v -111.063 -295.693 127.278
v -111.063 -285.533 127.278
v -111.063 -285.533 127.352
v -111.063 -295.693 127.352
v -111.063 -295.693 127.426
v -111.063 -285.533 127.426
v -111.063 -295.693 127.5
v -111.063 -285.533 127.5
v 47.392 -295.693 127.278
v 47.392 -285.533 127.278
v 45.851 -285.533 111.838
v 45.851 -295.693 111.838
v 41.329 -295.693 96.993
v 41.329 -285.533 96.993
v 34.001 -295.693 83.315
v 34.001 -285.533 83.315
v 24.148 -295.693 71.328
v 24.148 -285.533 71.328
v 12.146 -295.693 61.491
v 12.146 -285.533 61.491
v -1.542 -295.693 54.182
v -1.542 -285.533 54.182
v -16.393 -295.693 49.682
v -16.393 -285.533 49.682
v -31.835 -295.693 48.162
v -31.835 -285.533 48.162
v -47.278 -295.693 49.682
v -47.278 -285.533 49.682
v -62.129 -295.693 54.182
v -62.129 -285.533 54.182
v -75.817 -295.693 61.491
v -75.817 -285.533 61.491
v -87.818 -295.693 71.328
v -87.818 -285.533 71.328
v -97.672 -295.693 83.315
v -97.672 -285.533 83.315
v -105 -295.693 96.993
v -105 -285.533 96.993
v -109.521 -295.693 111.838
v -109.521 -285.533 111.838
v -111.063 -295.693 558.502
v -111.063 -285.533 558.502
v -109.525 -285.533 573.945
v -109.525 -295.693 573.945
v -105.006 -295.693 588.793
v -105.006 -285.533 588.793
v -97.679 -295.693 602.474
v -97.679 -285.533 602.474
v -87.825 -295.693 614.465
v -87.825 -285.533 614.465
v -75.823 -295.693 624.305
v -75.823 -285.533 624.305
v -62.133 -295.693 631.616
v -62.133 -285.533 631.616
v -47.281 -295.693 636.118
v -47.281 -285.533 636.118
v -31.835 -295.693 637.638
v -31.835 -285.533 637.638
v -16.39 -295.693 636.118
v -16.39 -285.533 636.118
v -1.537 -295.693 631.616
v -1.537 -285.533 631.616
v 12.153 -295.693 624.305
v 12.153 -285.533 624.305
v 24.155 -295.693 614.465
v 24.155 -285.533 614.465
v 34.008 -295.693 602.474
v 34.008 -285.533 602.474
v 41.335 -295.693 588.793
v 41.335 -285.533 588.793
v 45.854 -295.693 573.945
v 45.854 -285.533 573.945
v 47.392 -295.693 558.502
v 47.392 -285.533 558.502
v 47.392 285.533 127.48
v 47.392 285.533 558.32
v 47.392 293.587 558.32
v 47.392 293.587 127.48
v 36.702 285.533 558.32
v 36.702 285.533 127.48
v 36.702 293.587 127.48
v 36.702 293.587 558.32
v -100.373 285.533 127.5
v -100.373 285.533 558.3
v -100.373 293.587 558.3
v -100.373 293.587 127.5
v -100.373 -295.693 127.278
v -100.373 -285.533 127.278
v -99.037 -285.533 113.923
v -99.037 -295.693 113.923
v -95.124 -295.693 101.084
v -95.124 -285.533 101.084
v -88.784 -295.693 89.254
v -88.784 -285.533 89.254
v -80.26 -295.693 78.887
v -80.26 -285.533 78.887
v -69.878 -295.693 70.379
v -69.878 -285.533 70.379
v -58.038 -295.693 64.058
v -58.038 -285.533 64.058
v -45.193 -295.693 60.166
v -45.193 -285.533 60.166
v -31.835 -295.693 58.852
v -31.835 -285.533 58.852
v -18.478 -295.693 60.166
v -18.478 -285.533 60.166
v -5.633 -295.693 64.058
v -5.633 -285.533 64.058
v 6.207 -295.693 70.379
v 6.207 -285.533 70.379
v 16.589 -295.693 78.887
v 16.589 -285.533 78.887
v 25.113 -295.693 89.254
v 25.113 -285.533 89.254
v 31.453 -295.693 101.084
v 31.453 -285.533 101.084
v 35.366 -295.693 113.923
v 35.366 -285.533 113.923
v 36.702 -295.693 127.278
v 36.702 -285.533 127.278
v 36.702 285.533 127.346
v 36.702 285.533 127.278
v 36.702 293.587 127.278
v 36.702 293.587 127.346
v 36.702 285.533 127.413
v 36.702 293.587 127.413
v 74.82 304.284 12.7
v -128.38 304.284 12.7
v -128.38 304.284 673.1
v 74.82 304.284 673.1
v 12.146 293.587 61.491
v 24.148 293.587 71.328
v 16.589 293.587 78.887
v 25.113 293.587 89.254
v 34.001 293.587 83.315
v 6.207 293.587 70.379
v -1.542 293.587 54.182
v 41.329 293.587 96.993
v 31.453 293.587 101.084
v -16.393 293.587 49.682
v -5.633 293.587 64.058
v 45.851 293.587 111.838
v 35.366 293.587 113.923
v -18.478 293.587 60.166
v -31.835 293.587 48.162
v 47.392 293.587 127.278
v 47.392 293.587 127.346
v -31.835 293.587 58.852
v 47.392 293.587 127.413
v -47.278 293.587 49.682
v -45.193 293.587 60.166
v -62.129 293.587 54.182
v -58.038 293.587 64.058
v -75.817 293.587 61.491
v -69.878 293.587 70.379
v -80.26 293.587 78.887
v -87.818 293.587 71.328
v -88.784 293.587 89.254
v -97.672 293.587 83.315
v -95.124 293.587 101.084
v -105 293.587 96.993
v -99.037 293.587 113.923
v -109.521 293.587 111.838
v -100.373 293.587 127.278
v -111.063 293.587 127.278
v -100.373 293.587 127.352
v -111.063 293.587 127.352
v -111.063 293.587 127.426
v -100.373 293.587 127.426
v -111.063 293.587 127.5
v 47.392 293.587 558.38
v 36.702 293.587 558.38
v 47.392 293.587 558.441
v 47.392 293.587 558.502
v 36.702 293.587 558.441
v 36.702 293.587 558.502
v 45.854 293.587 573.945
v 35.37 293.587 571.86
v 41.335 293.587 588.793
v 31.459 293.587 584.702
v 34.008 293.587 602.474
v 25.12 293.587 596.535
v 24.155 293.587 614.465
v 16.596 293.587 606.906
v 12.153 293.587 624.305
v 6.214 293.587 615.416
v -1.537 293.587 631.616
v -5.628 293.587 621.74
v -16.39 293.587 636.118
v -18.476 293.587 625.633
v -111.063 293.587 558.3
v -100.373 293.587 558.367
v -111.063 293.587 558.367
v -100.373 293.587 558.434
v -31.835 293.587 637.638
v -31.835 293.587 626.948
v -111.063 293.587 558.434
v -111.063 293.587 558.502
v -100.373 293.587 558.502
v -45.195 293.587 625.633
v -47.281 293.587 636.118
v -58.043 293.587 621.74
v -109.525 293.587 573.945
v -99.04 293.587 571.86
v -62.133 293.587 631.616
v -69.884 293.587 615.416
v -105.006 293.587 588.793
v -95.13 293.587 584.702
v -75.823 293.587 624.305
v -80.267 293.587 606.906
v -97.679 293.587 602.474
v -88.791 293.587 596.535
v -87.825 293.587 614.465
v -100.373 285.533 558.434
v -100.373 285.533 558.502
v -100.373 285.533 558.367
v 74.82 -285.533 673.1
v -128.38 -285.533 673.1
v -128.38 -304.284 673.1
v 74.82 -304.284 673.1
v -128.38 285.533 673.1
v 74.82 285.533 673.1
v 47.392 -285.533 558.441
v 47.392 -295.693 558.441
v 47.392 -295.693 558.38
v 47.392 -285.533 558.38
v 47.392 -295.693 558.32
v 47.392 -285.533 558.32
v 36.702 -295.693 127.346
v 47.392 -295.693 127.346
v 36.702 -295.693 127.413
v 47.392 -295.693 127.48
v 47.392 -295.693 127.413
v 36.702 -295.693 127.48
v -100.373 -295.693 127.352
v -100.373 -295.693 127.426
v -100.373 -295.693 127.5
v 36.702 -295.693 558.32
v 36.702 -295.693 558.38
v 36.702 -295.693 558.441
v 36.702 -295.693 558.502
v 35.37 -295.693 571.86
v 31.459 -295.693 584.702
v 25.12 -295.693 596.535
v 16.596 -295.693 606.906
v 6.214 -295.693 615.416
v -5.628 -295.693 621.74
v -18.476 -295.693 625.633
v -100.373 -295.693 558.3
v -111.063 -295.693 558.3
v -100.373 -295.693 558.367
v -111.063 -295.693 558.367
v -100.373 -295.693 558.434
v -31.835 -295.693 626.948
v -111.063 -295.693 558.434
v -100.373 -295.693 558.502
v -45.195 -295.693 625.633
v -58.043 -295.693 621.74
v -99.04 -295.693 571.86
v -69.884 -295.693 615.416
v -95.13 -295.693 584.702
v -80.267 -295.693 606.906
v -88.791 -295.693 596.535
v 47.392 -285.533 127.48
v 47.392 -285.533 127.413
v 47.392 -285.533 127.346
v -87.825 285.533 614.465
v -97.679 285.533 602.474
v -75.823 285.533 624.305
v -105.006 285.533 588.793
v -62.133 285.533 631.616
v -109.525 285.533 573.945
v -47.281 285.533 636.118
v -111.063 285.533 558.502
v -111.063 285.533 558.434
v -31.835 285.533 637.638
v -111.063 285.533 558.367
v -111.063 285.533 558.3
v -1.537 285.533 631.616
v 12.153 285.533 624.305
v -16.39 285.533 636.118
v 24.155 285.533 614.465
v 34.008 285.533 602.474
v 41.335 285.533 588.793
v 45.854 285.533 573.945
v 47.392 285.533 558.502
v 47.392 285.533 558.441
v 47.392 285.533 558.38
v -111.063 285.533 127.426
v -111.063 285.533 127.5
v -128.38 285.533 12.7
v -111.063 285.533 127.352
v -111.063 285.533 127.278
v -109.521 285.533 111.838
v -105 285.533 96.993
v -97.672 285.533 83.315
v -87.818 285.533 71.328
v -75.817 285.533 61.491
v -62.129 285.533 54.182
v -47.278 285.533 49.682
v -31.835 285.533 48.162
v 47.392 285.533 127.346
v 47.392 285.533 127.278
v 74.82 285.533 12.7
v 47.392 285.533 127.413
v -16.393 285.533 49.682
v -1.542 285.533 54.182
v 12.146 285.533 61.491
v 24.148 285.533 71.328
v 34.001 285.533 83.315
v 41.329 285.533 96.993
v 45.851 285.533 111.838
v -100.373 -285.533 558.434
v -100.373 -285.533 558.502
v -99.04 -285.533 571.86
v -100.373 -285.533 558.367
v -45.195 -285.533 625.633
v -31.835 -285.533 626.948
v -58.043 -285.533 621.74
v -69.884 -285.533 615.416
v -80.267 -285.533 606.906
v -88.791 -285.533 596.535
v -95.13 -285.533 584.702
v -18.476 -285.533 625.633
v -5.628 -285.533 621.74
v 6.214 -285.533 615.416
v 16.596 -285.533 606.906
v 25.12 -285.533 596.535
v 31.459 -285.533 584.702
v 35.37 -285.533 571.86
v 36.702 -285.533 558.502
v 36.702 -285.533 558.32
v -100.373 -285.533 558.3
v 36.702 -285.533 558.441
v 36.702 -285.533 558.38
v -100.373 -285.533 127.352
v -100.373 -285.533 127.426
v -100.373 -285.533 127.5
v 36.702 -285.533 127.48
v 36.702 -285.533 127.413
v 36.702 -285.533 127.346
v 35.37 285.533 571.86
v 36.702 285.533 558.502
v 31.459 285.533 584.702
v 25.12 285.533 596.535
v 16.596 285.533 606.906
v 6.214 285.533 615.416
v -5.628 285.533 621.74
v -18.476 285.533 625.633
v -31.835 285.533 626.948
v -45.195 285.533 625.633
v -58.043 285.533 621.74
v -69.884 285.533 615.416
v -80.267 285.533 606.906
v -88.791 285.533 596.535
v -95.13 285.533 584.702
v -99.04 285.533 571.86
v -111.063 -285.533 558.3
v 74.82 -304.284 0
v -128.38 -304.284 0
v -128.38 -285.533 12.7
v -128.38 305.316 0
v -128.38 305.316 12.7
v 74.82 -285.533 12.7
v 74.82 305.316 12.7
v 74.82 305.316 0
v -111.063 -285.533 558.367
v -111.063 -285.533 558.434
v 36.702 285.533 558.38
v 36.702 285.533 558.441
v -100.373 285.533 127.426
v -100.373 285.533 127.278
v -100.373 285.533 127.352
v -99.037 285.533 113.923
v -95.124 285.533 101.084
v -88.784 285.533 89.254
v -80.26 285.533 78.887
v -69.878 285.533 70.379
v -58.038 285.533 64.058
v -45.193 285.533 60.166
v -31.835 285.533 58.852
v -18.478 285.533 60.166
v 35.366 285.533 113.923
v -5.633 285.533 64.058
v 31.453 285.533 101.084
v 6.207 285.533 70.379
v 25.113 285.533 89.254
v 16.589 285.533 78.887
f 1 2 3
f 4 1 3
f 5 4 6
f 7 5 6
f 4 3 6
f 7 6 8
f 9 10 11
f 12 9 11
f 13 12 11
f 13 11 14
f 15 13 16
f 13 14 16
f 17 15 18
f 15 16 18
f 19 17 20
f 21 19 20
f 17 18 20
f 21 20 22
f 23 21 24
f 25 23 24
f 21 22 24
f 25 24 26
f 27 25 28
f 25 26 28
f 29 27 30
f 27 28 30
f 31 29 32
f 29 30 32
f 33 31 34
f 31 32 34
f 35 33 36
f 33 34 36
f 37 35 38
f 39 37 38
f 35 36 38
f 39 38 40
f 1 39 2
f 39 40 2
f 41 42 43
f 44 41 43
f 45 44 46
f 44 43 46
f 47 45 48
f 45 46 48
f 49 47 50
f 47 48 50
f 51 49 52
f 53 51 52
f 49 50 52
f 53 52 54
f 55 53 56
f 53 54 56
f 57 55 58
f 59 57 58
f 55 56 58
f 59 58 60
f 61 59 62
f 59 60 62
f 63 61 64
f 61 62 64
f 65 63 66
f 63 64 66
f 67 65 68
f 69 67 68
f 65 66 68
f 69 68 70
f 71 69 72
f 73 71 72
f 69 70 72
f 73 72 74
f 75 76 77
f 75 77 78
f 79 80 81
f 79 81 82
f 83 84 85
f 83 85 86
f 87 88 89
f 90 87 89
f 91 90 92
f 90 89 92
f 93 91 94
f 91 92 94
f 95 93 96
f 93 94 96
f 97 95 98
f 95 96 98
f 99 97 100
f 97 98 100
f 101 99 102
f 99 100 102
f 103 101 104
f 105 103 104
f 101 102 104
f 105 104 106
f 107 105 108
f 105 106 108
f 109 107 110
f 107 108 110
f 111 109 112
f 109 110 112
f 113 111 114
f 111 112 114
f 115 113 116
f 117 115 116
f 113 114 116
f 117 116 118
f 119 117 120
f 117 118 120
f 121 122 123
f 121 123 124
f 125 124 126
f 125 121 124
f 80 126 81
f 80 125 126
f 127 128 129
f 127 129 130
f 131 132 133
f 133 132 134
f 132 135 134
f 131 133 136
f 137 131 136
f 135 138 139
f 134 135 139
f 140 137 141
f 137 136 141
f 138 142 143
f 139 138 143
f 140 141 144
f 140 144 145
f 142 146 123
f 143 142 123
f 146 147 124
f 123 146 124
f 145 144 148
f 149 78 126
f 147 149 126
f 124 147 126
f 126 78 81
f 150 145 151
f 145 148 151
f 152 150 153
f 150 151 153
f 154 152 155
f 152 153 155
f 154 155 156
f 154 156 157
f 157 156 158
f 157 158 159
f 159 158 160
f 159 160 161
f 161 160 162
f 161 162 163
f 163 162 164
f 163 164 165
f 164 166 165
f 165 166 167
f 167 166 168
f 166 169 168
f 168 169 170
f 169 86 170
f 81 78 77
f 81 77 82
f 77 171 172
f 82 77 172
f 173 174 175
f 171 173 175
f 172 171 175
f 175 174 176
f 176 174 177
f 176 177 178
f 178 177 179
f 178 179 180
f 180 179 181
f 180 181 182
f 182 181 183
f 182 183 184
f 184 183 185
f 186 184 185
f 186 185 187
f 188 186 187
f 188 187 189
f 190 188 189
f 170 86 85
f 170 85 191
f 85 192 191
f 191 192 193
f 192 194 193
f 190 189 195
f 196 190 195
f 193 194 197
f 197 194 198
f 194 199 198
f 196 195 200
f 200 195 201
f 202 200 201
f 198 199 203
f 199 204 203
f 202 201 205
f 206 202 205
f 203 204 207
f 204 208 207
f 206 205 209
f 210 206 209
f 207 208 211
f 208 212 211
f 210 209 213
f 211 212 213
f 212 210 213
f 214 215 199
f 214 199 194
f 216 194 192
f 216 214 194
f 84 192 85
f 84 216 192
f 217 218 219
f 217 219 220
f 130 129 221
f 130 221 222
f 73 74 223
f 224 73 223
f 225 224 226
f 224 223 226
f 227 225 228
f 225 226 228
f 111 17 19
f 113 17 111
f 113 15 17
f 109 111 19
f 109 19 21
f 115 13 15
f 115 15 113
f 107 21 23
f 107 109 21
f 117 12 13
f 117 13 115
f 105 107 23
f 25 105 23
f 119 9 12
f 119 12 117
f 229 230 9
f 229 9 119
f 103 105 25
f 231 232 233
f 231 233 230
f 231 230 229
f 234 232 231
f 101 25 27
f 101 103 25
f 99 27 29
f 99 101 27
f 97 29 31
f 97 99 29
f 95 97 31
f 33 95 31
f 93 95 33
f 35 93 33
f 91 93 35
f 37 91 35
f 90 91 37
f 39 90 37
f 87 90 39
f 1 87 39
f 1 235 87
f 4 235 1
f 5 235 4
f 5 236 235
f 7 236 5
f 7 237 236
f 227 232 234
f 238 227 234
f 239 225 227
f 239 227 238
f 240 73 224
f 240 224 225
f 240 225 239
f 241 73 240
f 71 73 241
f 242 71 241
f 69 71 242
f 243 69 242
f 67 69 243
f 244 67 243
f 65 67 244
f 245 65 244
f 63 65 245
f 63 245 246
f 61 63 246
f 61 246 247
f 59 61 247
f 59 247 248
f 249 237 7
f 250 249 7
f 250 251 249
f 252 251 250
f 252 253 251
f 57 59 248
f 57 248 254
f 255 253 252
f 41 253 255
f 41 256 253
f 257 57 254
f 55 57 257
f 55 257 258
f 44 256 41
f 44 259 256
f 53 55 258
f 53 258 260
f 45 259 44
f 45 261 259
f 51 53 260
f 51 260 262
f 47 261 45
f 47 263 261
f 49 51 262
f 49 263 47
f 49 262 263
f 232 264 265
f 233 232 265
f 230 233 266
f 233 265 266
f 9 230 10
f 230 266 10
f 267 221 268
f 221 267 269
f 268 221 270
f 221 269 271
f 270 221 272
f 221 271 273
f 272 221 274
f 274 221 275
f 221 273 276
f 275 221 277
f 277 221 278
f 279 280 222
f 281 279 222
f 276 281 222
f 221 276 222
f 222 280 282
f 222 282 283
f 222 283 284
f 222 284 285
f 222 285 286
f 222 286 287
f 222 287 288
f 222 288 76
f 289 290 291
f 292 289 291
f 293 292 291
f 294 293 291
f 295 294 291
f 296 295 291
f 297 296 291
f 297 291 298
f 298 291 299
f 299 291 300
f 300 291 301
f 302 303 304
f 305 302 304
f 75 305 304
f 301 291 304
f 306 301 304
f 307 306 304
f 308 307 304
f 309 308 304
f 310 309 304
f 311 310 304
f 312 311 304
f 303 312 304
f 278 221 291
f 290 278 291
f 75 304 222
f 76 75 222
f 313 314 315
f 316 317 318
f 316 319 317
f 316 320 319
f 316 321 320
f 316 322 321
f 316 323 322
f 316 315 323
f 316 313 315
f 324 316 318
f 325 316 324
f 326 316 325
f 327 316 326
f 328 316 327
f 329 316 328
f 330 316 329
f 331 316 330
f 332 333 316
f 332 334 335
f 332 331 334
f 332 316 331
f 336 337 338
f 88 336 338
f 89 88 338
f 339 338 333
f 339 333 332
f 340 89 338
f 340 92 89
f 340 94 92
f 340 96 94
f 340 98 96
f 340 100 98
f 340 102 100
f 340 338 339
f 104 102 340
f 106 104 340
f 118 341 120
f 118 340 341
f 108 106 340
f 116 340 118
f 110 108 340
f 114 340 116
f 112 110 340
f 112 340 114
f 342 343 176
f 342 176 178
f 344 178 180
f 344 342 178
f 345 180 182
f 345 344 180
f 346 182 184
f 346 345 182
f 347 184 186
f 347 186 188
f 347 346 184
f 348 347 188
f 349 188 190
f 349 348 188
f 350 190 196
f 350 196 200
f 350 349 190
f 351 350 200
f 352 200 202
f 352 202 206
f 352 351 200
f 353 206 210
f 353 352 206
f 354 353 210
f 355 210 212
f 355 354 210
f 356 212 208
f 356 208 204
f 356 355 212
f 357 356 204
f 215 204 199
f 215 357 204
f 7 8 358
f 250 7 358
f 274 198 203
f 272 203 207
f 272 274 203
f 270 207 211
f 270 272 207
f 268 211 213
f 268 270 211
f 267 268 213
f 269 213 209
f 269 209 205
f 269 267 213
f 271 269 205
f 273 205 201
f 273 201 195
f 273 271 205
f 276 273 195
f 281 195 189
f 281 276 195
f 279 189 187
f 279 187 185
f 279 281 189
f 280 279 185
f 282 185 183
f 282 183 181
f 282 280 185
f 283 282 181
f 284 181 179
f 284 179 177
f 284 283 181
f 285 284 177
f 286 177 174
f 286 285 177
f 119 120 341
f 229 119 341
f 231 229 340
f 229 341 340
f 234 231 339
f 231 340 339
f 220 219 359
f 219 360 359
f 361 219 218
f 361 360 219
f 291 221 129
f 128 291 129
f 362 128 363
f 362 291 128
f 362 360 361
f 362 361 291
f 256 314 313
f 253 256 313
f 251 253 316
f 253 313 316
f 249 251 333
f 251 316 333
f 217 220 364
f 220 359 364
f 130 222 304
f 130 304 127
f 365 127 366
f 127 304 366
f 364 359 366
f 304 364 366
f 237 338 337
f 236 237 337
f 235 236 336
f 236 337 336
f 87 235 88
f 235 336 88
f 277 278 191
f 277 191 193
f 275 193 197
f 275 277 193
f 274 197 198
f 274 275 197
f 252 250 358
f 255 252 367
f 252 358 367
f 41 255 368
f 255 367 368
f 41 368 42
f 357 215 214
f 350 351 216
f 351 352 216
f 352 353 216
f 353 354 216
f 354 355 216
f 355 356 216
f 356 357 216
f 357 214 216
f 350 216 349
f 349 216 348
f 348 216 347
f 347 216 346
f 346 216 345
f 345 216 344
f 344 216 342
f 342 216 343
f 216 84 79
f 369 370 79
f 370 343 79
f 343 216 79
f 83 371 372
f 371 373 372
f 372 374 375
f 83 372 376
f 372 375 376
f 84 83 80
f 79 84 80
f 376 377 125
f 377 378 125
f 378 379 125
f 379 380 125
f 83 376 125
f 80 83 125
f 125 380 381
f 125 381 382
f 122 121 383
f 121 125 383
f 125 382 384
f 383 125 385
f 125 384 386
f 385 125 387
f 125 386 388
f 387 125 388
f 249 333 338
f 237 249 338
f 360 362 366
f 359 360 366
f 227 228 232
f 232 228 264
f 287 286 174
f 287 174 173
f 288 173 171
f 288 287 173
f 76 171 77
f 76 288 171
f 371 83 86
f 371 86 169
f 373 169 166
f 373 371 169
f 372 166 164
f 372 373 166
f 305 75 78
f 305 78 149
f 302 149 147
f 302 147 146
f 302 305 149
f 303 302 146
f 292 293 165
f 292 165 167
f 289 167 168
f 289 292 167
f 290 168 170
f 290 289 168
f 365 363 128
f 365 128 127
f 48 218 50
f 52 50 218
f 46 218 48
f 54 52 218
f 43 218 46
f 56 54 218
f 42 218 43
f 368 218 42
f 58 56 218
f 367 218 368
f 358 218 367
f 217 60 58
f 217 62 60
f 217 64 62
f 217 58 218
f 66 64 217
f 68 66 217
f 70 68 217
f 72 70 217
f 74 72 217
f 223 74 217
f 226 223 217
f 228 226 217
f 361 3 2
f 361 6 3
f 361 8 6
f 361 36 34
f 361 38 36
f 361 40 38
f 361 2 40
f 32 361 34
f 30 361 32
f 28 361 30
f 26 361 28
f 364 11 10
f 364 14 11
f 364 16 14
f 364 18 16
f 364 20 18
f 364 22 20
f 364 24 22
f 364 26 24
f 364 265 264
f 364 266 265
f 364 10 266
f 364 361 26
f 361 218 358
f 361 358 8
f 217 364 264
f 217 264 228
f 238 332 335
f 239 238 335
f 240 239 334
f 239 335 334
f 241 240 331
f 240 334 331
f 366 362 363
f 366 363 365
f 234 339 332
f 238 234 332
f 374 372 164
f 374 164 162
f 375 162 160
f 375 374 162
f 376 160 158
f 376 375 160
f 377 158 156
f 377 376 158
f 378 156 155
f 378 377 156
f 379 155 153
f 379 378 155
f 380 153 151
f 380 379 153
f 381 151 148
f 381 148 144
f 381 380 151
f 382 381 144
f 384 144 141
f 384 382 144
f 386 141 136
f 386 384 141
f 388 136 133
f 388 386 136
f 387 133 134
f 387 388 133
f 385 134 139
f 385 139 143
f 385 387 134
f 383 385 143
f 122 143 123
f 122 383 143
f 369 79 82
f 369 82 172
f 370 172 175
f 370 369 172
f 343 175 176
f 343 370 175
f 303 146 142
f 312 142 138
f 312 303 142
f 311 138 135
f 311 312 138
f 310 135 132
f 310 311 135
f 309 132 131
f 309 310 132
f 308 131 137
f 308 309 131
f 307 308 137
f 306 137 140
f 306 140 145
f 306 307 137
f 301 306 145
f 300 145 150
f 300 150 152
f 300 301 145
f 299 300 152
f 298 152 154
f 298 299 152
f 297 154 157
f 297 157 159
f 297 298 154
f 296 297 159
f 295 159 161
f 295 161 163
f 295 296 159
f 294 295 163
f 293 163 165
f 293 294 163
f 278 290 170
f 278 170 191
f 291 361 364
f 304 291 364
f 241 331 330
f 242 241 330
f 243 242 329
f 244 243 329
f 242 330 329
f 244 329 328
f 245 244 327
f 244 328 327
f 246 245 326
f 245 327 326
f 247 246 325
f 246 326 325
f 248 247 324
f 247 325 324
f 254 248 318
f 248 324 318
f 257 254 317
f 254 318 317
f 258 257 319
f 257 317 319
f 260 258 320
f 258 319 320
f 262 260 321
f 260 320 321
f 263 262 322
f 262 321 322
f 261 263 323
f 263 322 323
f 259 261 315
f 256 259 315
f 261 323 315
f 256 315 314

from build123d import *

# Parameters (mm, degrees)
F0_W          = 203.2
F0_H          = 609.6
F1_DEPTH      = 12.7
F2_W          = 203.2
F2_H          = 18.7501087368
F3_DEPTH      = 660.4
F5_DEPTH      = 10.16
F5_DEPTH_BACK = 579.12


with BuildPart() as f1:
    # F0 (on Top) → F1 (new body)
    with BuildSketch(Plane.XY):
        with Locations((-26.7803451535, 0.5164034665)):
            Rectangle(F0_W, F0_H)
    extrude(amount=F1_DEPTH)

    # F2 (on face) → F3 (join)
    with BuildSketch(Plane.XY.offset(12.7)):
        with Locations((-26.7803451535, 294.9085421652)):
            Rectangle(F2_W, F2_H)
        with Locations((-26.7803451535, -294.9085421652)):
            Rectangle(F2_W, F2_H)
    extrude(amount=F3_DEPTH)

    # F4 (on face) → F5 (cut, two sides)
    with BuildSketch(Plane(origin=(0, -285.5334877968, 0), x_dir=(-1, 0, 0), z_dir=(0, 1, 0))) as f5_sk:
        with BuildLine():
            Line((-47.3919240568, 558.3197568053), (-47.3919240568, 127.4802431947))
            ThreePointArc((-47.3919240568, 127.4802431947), (-47.3919755667, 127.3792859835), (-47.3918984296, 127.2783287887))
            ThreePointArc((-47.3918984296, 127.2783287887), (31.835410726, 48.161954644), (111.0627199175, 127.2783287527))
            ThreePointArc((111.0627199175, 127.2783287527), (111.0627976927, 127.3893415928), (111.0627199175, 127.5003544328))
            Line((111.0627199175, 127.5003544328), (111.0627199175, 558.2996455672))
            ThreePointArc((111.0627199175, 558.2996455672), (111.0627970546, 558.4006027949), (111.0627455447, 558.5015600389))
            ThreePointArc((111.0627455447, 558.5015600389), (31.835410729, 637.638045356), (-47.3919240568, 558.5015600091))
            ThreePointArc((-47.3919240568, 558.5015600091), (-47.3919762048, 558.4106584072), (-47.3919240568, 558.3197568053))
        make_face()
        with BuildLine():
            ThreePointArc((-36.7020475123, 127.2783288007), (-36.7021366804, 127.3792859868), (-36.7020771365, 127.4802431948))
            Line((-36.7020771365, 127.4802431948), (-36.7020771365, 558.3197568053))
            ThreePointArc((-36.7020771365, 558.3197568053), (-36.7021374181, 558.4106584072), (-36.7020771365, 558.5015600091))
            ThreePointArc((-36.7020771365, 558.5015600091), (31.8354107241, 626.9482065693), (100.3728986244, 558.5015600488))
            ThreePointArc((100.3728986244, 558.5015600488), (100.3729581683, 558.400602797), (100.3728690001, 558.2996455671))
            Line((100.3728690001, 558.2996455671), (100.3728690001, 127.5003544328))
            ThreePointArc((100.3728690001, 127.5003544328), (100.372958906, 127.3893415928), (100.3728690001, 127.2783287527))
            ThreePointArc((100.3728690001, 127.2783287527), (31.83541072, 58.8517934307), (-36.7020475123, 127.2783288007))
        make_face(mode=Mode.SUBTRACT)
    extrude(amount=-F5_DEPTH, mode=Mode.SUBTRACT)
    extrude(f5_sk.sketch, amount=F5_DEPTH_BACK, mode=Mode.SUBTRACT)


solid = f1.part
